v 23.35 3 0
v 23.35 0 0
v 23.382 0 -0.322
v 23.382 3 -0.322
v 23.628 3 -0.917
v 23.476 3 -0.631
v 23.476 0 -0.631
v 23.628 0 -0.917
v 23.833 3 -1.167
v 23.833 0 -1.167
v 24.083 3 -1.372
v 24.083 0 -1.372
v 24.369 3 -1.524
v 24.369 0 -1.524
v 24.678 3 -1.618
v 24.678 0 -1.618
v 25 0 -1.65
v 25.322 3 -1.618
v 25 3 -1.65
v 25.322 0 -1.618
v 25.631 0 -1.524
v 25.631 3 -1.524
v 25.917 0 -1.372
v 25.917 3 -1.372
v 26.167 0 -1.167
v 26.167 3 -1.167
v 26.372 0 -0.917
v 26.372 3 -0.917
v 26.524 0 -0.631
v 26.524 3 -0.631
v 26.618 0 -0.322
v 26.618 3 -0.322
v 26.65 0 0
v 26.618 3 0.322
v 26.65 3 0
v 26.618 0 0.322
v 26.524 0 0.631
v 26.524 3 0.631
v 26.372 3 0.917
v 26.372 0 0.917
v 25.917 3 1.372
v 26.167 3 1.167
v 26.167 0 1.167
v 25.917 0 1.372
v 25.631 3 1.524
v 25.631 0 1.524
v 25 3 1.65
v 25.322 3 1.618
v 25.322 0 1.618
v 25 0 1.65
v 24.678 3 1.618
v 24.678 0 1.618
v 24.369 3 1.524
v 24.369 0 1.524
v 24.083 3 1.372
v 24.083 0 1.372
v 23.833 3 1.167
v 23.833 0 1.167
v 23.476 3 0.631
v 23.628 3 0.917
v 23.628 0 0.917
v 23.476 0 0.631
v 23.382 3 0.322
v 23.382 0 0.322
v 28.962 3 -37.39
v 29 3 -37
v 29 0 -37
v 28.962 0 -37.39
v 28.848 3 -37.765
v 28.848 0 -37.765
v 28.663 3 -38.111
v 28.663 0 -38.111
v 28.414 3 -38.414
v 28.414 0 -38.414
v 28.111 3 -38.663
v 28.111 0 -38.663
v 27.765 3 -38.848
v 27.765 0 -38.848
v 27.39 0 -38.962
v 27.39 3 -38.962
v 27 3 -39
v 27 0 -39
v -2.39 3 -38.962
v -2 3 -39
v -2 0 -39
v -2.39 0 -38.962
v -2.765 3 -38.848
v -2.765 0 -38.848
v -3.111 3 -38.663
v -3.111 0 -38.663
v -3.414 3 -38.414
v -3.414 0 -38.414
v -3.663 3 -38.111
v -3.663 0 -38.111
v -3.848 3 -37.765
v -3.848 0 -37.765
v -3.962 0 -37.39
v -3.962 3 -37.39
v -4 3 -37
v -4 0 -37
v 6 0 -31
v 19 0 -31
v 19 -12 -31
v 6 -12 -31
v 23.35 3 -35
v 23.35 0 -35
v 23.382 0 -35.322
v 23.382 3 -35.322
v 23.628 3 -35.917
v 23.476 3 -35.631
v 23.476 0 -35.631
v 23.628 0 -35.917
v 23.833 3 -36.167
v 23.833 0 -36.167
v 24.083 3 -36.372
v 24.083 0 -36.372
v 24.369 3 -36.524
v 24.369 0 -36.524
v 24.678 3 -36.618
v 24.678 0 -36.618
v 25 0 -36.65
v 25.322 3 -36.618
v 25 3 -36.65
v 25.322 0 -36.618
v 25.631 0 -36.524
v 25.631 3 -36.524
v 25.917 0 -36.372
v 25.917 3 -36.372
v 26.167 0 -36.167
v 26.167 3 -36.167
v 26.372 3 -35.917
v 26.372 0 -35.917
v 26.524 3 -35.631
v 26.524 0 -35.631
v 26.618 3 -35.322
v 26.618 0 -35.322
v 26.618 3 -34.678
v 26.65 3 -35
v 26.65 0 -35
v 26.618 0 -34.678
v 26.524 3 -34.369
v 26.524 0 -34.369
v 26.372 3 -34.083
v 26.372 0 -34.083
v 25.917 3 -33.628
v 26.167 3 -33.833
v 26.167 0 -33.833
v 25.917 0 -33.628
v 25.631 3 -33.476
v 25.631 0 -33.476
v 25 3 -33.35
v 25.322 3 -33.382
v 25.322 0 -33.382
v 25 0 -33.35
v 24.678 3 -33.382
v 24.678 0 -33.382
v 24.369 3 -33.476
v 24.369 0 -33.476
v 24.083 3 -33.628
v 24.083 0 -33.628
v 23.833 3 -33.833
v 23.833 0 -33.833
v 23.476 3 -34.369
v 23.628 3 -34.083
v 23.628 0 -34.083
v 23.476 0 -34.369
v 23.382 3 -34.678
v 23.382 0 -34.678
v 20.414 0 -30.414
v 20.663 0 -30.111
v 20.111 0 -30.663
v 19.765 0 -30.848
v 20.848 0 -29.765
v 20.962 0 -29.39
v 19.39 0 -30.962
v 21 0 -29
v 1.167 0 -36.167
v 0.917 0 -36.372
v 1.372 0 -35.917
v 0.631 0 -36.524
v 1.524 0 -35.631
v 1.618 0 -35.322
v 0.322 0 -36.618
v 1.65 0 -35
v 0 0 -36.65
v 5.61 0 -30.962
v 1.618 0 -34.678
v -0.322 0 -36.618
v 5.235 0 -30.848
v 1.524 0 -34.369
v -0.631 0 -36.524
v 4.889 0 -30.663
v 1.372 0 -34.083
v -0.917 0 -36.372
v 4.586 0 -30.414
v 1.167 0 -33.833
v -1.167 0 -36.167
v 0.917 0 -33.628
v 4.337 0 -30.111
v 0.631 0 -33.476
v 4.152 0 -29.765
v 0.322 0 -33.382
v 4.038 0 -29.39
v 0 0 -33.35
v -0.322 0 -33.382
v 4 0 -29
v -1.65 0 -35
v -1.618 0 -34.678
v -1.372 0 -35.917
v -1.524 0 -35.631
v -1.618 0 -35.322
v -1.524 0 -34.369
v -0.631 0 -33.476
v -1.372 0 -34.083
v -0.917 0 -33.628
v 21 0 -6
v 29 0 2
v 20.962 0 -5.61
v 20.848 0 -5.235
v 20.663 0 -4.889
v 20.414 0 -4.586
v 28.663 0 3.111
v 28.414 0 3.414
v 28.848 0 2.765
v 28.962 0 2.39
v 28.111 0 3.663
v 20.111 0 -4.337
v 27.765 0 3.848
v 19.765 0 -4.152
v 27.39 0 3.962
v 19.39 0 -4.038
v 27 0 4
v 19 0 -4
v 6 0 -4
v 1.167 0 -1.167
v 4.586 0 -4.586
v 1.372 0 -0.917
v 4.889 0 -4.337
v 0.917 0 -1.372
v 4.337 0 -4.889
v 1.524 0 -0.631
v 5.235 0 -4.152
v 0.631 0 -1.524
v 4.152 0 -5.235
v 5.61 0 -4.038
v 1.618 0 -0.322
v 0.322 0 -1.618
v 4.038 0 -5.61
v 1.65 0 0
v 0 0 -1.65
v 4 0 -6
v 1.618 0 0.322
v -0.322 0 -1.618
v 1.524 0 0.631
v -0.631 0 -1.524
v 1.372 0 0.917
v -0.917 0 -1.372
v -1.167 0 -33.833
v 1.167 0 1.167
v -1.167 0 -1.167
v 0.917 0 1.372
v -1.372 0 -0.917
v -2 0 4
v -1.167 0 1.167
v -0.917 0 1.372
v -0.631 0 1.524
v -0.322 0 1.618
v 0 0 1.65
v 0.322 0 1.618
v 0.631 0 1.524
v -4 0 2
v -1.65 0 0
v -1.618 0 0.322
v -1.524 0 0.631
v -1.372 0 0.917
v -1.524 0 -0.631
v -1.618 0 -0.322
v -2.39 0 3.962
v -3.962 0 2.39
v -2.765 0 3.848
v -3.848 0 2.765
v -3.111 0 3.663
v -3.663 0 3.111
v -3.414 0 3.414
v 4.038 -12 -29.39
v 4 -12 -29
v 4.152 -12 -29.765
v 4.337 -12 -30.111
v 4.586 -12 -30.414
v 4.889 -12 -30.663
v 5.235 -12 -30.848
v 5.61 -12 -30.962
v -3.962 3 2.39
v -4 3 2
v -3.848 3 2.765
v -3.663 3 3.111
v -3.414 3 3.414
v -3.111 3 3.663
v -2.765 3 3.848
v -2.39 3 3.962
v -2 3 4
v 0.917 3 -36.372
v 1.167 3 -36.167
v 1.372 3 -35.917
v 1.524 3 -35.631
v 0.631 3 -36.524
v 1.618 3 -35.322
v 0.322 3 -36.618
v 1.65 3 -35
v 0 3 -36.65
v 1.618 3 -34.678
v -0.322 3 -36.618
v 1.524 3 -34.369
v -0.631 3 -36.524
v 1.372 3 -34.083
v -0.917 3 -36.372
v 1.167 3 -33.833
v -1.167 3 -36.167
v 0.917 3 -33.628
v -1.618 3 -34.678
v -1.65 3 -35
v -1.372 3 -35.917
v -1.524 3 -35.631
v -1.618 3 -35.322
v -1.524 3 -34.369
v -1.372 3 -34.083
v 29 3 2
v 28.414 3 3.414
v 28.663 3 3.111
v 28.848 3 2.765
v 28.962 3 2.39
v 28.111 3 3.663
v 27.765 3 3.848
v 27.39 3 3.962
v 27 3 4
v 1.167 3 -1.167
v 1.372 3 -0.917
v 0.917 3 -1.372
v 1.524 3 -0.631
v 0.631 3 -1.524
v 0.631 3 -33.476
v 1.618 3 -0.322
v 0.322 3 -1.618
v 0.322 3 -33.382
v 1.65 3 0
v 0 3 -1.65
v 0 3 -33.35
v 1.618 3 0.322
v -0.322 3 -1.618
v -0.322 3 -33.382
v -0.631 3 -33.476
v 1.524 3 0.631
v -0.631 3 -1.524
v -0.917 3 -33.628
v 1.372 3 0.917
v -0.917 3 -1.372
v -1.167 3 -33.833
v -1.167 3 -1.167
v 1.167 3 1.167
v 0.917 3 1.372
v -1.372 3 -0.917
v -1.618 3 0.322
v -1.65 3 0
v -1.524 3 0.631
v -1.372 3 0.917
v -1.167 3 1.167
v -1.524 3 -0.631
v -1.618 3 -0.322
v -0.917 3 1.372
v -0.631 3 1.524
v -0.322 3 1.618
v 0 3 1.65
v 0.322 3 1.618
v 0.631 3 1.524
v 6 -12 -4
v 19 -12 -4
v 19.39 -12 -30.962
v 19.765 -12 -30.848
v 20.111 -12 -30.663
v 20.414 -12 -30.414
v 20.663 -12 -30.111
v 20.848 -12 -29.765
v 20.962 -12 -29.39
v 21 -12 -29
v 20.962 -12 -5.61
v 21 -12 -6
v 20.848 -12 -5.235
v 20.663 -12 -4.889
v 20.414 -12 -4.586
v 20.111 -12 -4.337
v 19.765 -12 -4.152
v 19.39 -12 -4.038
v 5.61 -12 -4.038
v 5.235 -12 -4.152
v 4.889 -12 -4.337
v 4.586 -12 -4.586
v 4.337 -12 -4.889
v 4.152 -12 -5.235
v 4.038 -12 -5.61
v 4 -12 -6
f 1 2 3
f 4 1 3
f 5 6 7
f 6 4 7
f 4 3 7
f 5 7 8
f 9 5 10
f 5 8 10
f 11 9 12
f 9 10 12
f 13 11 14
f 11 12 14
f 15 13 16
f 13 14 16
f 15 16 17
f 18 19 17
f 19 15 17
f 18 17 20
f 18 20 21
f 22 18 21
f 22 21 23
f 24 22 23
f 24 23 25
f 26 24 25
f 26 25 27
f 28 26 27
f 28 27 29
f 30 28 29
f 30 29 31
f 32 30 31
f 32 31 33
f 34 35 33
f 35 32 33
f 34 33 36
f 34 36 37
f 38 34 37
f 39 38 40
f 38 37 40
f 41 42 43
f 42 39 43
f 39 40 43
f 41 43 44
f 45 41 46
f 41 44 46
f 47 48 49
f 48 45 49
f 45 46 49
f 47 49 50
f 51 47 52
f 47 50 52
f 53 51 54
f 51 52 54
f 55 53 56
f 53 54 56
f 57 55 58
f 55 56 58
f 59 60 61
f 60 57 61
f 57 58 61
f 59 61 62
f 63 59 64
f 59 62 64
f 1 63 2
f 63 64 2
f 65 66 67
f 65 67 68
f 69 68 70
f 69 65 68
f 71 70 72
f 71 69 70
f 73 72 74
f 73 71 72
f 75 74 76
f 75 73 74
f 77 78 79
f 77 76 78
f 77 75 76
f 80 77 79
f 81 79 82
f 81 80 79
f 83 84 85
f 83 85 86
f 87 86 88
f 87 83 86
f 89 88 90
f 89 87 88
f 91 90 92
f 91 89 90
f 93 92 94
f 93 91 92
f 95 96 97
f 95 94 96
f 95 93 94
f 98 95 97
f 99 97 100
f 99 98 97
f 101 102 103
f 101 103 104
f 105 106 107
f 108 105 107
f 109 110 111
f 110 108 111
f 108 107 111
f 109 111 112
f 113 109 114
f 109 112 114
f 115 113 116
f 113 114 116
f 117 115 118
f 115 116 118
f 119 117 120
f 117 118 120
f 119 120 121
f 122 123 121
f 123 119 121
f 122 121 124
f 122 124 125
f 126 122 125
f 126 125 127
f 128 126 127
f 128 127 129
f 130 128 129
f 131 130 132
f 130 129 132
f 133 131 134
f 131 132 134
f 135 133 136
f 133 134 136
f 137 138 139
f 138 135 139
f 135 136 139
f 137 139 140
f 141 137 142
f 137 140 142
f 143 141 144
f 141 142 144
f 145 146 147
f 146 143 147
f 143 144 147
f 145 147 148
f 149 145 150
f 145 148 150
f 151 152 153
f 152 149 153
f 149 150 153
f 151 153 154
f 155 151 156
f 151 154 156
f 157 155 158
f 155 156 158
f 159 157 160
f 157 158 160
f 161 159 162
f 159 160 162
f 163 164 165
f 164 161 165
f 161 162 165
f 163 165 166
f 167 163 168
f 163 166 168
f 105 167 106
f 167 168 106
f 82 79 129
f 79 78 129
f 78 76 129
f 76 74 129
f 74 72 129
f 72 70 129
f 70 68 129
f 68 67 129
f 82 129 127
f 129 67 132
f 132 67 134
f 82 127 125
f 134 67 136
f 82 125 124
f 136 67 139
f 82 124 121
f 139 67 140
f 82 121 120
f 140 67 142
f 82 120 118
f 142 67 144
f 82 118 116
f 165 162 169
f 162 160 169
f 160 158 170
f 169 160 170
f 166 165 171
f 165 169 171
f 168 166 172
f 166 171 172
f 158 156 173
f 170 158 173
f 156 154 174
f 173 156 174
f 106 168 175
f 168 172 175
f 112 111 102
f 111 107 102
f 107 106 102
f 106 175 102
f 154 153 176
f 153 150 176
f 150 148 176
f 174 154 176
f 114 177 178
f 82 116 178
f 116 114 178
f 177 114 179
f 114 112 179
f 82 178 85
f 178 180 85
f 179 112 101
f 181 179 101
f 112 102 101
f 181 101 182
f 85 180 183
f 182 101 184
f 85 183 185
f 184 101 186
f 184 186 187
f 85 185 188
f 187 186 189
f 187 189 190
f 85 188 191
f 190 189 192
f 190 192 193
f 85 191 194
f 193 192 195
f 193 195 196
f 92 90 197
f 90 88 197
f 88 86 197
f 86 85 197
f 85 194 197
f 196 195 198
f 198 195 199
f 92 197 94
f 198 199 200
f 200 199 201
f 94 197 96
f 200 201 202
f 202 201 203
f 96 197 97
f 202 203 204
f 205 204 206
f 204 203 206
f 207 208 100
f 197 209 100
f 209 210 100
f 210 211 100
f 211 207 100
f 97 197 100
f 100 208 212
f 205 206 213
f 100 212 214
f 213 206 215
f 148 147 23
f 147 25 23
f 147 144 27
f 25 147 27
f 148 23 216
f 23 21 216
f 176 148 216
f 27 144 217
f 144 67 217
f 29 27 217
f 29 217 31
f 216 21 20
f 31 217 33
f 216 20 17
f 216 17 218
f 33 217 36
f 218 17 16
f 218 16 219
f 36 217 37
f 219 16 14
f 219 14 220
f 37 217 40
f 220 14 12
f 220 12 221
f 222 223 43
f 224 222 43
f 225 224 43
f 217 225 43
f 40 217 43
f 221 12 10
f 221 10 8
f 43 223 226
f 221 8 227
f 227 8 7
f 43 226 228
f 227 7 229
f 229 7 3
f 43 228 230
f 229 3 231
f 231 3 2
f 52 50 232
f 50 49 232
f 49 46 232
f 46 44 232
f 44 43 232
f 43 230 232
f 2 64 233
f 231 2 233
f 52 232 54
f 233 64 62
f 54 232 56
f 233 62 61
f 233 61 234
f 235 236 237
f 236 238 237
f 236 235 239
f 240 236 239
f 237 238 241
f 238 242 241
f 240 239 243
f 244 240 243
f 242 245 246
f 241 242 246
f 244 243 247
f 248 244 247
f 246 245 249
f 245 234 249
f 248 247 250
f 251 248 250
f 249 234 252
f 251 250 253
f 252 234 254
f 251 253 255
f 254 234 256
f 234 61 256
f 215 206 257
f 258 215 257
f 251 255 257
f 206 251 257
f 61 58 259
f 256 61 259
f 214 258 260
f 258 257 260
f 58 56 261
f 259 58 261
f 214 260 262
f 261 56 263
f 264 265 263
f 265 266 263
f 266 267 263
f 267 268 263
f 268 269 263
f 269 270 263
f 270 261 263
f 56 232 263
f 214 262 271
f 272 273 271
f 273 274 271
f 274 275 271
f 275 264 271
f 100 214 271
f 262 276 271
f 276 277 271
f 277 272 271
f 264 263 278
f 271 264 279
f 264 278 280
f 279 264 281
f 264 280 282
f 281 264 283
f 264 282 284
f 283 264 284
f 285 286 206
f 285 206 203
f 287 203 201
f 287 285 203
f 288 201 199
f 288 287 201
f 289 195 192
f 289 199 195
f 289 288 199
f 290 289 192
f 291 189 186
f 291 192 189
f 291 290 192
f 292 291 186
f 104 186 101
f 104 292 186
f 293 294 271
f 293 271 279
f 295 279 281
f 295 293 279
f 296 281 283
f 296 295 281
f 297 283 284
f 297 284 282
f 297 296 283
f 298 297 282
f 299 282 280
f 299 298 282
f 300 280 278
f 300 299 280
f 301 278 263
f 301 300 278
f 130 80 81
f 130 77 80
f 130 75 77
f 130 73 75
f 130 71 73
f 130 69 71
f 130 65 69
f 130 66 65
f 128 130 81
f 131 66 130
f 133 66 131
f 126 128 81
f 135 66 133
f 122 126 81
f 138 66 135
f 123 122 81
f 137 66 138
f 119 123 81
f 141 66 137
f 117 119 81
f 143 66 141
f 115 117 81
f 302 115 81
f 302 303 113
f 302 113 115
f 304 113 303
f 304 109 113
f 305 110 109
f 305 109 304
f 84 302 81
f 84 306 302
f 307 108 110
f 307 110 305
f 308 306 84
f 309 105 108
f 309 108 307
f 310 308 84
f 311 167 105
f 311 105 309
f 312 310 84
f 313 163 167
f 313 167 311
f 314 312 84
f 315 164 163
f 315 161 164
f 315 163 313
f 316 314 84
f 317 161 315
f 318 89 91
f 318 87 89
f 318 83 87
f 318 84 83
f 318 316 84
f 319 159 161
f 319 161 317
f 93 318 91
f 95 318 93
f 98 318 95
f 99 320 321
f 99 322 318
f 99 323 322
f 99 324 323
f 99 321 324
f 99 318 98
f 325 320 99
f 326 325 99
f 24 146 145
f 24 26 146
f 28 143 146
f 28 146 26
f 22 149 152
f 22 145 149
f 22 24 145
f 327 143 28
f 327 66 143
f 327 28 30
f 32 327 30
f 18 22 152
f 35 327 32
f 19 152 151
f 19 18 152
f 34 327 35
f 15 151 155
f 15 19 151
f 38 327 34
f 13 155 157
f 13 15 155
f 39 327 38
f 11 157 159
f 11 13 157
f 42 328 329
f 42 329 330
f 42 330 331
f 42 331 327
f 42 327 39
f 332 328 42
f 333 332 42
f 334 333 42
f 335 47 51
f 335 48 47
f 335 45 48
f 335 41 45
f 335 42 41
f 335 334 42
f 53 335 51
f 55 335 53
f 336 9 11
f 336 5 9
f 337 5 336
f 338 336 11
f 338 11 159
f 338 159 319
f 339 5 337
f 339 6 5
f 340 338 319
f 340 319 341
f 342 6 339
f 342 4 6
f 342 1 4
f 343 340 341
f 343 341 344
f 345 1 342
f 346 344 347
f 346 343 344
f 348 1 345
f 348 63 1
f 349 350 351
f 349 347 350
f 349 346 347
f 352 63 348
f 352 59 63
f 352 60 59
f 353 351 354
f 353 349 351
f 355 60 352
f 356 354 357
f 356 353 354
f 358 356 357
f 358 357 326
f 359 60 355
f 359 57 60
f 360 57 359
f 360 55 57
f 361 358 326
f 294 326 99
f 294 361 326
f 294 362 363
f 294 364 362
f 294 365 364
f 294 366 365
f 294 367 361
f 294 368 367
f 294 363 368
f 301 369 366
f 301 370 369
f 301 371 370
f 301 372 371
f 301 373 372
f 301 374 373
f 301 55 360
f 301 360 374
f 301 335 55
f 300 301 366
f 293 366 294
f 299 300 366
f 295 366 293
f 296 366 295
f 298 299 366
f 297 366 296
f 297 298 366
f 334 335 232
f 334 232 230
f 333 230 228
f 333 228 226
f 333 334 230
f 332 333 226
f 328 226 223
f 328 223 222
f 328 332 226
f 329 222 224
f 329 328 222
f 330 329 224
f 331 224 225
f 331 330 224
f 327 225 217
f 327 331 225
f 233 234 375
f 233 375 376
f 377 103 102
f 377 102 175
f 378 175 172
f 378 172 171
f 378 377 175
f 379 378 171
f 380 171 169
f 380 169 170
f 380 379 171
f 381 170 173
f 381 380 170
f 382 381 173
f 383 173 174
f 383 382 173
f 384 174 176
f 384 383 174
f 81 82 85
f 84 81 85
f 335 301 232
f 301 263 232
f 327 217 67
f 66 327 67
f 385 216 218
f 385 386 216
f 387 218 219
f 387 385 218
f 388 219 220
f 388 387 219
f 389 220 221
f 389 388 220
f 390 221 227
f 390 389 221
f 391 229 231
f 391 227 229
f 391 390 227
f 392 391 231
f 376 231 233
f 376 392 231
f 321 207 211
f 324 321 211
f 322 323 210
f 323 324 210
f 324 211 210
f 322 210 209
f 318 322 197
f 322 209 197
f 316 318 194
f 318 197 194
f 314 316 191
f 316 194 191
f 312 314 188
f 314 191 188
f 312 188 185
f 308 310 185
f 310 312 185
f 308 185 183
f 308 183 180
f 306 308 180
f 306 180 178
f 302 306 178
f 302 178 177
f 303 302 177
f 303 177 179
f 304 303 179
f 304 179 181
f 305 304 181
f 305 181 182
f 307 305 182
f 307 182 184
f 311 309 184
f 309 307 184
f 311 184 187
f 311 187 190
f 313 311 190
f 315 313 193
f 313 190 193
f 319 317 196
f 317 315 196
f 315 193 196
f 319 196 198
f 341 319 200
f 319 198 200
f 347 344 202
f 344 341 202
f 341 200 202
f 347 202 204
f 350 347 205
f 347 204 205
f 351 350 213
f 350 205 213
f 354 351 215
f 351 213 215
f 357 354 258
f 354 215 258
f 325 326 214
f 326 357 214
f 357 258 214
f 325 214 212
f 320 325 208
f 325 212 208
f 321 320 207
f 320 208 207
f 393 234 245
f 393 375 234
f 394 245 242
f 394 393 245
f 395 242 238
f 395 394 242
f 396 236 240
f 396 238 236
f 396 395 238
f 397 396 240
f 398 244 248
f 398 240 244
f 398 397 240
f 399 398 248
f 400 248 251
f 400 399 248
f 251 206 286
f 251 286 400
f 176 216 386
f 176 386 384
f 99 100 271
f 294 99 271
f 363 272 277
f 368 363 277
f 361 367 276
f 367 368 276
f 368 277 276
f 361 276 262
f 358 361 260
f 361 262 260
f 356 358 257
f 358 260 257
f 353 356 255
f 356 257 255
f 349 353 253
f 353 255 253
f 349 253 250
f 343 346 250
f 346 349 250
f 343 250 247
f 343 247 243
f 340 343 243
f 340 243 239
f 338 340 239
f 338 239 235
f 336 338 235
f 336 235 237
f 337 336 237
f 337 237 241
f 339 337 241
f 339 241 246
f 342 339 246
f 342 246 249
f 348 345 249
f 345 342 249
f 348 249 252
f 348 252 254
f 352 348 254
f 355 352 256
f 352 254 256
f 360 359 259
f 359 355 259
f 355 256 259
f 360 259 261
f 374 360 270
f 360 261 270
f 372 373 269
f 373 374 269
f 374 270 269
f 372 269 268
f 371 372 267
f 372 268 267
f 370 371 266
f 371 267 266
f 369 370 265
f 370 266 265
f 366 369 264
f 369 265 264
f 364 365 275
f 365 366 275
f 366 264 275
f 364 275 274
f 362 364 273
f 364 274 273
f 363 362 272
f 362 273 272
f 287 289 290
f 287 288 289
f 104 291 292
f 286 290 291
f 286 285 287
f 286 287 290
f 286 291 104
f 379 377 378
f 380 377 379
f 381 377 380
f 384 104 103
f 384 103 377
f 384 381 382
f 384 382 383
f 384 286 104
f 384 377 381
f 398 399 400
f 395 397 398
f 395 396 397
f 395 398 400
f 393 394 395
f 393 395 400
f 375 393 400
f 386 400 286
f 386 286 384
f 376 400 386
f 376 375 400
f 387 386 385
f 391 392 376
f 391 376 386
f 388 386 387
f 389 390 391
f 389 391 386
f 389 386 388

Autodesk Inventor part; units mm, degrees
ref_plane "YZ Plane" through (0, 0, 0) normal (1, 0, 0) x (0, 1, 0)
ref_plane "XZ Plane" through (0, 0, 0) normal (0, 1, 0) x (-1, 0, 0)
ref_plane "XY Plane" through (0, 0, 0) normal (0, 0, 1) x (1, 0, 0)
sketch "Sketch1" plane through (0, 0, 0) normal (0, 1, 0) x (-1, 0, 0)
  circle A0 centre (0, 0) radius 1.65
  circle A1 centre (0, -35) radius 1.65
  circle A2 centre (-25, 0) radius 1.65
  circle A3 centre (-25, -35) radius 1.65
  line L0 (0, 0) -> (-25, 0) construction
  line L1 (-25, 0) -> (-25, -35) construction
  line L2 (-25, -35) -> (0, -35) construction
  line L3 (0, -35) -> (0, 0) construction
  line L4 (4, 4) -> (-29, 4)
  line L5 (-29, 4) -> (-29, -39)
  line L6 (-29, -39) -> (4, -39)
  line L7 (4, -39) -> (4, 4)
  dimension "d1" = 3.3
  dimension "d2" = 3.3
  dimension "d4" = 3.3
  dimension "d5" = 3.3
  dimension "d6" = 35
  dimension "d7" = 25
  dimension "d8" = 4
extrude "Extrusion1" add sketch "Sketch1" along normal blind 3
sketch "Sketch2" plane through (0, 0, 0) normal (0, -1, 0) x (1, 0, 0)
  circle A0 centre (25, -35) radius 1.65 construction
  circle A1 centre (25, 0) radius 1.65 construction
  circle A2 centre (0, -35) radius 1.65 construction
  circle A3 centre (0, 0) radius 1.65 construction
  line L0 (29, -39) -> (-4, -39) projected
  line L1 (-4, -39) -> (-4, 4) projected
  line L2 (-4, 4) -> (29, 4) projected
  line L3 (29, 4) -> (29, -39) projected
  line L4 (21, -31) -> (4, -31)
  line L5 (4, -31) -> (4, -4)
  line L6 (4, -4) -> (21, -4)
  line L7 (21, -4) -> (21, -31)
  dimension "d11" = 8
extrude "Extrusion2" add sketch "Sketch2" along normal blind 12 contours L4 L5 L6 L7
fillet "Fillet1" radius 2 8 edges at (29, 1.5, 4) (-4, 1.5, 4) (-4, 1.5, -39) (29, 1.5, -39) (21, -6, -4) (4, -6, -4) (4, -6, -31) (21, -6, -31)
properties part number "gravity-pcb-mount"
